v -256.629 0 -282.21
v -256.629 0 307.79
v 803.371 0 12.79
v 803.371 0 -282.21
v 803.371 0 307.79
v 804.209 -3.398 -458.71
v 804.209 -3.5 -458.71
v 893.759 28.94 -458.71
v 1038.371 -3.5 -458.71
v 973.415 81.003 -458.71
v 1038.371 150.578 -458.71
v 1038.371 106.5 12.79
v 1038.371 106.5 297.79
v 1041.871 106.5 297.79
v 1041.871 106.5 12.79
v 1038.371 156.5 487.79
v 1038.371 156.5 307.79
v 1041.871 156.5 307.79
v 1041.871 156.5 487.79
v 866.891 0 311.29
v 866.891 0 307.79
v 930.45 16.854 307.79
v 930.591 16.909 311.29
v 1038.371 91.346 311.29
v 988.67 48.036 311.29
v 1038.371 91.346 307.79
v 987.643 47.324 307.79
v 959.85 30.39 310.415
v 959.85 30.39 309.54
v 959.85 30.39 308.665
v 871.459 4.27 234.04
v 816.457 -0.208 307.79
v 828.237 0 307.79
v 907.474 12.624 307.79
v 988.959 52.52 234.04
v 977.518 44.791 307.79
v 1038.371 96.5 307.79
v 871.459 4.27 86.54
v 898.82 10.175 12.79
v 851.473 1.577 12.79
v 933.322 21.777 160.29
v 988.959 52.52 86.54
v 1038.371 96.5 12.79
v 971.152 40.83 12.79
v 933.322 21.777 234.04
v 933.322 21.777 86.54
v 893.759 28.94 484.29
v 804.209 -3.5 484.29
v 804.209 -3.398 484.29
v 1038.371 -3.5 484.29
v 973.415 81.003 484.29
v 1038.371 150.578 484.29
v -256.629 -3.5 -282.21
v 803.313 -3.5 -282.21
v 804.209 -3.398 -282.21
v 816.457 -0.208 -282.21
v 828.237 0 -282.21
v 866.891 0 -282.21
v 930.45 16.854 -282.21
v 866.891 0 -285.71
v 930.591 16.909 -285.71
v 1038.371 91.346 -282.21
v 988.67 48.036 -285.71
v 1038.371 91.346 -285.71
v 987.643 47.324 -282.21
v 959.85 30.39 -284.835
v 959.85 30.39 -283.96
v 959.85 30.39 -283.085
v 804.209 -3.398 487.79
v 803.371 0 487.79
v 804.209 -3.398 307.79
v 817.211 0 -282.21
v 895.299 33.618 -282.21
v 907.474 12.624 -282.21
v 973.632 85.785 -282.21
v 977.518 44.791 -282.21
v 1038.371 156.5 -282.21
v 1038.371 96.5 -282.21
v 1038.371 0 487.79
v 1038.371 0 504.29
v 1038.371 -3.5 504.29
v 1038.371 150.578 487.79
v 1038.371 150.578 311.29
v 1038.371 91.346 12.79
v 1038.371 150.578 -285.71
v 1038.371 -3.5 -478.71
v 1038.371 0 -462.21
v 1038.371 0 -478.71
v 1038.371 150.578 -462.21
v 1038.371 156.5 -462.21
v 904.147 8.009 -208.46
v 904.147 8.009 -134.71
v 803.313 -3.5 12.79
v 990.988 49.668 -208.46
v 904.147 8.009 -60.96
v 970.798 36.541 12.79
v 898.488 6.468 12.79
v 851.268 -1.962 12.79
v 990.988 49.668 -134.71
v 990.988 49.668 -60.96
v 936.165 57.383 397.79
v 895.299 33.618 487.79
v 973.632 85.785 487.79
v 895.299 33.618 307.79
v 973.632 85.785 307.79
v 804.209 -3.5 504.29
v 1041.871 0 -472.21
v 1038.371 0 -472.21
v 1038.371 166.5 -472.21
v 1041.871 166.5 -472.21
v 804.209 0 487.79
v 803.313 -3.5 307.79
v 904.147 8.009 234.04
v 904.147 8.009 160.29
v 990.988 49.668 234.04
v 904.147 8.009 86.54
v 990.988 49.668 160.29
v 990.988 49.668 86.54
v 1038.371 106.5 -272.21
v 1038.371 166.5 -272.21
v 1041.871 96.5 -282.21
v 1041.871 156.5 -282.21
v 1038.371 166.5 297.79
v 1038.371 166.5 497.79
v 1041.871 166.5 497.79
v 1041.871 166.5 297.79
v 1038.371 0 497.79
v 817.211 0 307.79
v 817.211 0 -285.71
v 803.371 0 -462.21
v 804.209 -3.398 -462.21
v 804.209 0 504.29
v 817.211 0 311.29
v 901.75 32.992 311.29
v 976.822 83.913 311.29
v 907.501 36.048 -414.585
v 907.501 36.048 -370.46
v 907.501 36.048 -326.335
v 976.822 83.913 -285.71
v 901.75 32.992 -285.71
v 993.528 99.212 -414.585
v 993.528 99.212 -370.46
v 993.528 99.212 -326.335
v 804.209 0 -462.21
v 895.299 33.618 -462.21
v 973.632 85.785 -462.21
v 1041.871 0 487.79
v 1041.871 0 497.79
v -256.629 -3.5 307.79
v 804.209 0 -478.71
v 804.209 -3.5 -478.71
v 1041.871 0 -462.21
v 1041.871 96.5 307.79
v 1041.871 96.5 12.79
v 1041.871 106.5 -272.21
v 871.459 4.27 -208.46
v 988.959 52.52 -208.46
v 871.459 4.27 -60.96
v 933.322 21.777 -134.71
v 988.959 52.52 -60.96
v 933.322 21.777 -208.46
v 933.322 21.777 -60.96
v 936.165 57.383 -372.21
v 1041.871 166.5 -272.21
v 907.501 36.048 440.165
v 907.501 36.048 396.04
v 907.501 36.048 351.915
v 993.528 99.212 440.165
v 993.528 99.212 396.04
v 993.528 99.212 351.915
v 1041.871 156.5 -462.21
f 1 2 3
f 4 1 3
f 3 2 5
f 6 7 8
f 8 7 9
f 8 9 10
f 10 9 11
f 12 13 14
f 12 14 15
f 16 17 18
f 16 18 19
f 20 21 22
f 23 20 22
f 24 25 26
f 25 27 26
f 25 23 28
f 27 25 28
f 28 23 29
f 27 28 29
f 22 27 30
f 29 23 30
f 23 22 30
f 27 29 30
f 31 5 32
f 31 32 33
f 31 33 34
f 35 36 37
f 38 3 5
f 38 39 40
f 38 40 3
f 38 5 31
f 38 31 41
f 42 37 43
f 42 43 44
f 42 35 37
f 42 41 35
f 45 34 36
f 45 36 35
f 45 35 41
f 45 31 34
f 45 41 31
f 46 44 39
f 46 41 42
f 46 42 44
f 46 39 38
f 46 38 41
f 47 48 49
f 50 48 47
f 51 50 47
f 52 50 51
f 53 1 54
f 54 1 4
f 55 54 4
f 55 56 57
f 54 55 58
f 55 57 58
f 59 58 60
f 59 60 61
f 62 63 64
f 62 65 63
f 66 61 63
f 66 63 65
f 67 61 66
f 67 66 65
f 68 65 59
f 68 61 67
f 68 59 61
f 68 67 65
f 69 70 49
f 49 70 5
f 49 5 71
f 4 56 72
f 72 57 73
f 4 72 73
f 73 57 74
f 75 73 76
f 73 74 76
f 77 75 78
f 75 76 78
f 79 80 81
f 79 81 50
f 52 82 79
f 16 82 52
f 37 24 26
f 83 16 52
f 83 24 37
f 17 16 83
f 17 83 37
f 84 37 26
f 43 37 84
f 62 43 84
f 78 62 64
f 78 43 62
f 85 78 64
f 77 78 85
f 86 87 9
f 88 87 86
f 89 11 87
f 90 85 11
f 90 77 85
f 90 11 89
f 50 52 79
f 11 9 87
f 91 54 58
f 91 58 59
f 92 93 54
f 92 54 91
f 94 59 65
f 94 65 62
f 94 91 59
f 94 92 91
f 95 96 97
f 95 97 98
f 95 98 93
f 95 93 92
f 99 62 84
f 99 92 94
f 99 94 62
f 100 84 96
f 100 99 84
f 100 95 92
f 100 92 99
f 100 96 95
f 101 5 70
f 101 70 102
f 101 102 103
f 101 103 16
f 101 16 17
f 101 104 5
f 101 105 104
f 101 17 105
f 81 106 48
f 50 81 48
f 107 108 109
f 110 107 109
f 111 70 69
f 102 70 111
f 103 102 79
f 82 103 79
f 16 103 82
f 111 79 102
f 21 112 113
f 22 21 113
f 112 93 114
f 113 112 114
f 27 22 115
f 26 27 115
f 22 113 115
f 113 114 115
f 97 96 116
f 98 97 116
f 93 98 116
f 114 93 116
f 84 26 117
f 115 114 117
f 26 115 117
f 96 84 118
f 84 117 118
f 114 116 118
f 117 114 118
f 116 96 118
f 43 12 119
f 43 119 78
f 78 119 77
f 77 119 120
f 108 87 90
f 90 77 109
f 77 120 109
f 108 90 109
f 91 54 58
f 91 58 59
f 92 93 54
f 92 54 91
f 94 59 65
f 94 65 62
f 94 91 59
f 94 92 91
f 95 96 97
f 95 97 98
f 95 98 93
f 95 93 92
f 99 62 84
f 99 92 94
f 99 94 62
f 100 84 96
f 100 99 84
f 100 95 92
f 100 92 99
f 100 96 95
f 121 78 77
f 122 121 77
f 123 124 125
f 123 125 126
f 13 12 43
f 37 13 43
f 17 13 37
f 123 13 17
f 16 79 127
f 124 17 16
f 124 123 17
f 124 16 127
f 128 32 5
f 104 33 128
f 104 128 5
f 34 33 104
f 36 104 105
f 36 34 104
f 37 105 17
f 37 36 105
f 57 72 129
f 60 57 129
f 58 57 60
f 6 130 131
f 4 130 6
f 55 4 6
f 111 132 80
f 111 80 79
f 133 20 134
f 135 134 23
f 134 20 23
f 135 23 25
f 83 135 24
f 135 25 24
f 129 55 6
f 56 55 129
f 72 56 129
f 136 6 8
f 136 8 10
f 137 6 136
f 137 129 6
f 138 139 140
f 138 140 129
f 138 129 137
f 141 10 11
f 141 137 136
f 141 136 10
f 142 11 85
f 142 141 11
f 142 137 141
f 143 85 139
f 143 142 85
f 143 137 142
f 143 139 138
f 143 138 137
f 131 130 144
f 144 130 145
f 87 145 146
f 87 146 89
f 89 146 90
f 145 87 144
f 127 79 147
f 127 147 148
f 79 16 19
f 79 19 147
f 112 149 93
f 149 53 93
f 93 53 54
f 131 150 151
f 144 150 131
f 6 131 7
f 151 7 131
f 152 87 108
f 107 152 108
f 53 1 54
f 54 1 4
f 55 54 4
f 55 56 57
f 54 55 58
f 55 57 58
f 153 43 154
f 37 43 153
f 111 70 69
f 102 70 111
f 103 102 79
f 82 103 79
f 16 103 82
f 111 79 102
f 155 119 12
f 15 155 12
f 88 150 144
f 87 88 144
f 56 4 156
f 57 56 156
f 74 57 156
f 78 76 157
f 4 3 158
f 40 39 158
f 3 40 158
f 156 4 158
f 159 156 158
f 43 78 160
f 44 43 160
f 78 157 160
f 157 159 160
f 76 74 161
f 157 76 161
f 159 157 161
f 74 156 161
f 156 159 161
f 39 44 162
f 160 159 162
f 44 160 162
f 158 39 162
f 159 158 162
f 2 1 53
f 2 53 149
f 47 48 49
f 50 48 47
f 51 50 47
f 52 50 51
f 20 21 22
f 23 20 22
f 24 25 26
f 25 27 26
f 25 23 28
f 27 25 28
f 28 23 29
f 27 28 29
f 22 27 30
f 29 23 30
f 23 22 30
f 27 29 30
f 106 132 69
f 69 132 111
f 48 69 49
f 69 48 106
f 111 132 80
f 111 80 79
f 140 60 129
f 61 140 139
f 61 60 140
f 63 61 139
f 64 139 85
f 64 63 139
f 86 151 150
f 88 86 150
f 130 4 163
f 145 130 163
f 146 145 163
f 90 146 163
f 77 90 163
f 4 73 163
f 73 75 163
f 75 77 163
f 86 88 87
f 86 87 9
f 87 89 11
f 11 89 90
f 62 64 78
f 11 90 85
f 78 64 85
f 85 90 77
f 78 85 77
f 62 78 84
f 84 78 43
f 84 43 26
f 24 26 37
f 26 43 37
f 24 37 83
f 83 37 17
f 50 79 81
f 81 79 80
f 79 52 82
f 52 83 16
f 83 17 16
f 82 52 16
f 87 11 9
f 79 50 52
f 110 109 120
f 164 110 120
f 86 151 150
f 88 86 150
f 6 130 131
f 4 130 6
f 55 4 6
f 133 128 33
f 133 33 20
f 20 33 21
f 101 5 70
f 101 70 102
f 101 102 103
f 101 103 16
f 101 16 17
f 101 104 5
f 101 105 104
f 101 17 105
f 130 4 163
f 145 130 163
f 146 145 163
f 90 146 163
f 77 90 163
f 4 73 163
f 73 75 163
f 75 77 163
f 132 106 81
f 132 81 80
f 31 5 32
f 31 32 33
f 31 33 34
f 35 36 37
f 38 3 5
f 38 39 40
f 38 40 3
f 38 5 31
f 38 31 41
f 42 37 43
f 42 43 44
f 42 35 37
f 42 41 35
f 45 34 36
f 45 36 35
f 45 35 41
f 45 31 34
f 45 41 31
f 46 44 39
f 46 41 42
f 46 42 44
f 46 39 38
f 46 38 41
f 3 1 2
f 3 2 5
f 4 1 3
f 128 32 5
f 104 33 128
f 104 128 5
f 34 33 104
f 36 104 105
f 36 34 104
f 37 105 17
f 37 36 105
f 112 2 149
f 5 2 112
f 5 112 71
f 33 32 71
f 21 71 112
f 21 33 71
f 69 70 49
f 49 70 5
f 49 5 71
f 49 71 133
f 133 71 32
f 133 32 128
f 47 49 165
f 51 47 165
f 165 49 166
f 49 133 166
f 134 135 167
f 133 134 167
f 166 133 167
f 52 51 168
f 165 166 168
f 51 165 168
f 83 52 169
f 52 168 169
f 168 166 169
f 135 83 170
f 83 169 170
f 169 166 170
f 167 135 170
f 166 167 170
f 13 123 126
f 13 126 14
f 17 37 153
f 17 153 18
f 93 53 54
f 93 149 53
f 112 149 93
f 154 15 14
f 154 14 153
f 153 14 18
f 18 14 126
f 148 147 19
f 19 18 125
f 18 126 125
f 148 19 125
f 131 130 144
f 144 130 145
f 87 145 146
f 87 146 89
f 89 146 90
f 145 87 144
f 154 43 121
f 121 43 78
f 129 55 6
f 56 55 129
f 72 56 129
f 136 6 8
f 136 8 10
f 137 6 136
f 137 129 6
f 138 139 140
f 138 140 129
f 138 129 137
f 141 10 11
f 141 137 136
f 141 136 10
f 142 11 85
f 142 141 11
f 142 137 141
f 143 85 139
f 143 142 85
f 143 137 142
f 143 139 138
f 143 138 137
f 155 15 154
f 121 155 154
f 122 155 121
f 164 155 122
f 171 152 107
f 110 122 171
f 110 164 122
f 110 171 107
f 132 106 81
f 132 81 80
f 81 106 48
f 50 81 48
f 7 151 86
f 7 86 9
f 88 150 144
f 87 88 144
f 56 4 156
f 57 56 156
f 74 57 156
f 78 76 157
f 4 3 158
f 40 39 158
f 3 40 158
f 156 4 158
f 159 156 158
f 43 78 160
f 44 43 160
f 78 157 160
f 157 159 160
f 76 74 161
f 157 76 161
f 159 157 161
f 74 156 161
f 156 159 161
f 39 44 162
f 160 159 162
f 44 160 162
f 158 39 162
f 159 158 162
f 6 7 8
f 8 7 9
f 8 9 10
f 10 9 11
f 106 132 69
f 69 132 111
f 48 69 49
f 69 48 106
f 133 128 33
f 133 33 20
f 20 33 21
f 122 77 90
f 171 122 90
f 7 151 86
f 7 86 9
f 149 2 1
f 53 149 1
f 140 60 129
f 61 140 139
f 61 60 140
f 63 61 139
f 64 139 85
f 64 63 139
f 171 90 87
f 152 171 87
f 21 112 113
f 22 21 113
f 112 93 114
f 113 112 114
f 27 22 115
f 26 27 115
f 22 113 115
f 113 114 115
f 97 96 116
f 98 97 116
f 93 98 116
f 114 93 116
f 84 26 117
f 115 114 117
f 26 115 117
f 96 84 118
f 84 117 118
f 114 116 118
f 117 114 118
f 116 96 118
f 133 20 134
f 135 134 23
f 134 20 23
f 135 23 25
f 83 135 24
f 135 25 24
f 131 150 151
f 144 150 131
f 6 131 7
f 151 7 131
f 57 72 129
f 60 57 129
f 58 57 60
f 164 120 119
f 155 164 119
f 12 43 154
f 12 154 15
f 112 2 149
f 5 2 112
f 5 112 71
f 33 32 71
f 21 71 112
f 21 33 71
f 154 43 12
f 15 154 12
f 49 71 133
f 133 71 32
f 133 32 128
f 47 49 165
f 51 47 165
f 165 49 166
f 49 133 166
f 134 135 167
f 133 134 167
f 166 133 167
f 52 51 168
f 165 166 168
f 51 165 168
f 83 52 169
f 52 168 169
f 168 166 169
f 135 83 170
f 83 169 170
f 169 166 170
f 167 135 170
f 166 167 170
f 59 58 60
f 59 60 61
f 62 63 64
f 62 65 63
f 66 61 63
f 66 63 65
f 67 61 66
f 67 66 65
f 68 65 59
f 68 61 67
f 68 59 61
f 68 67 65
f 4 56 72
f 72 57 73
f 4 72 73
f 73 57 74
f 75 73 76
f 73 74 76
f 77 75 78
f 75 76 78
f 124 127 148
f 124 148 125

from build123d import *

# Parameters (mm, degrees)
SKETCH1_W            = 1060
SKETCH1_H            = 590
BOSS_EXTRUDE1_DEPTH  = 3.5
EXTRUDE_THIN1_START  = -590
EXTRUDE_THIN1_DEPTH  = 590
EXTRUDE_THIN2_DEPTH  = 180
EXTRUDE_THIN3_REACH  = 1162.405
SKETCH11_W           = 236.744190684
SKETCH11_H           = 3.5
EXTRUDE_THIN4_REACH  = 1162.405
SKETCH13_W           = 235
SKETCH13_H           = 3.5
CUT_EXTRUDE1_START   = -950
SKETCH18_W           = 9.295788825
SKETCH18_H           = 156.5
CUT_EXTRUDE1_DEPTH   = 950
CUT_EXTRUDE2_DEPTH   = 35.5
BOSS_EXTRUDE9_DEPTH  = 3.5
SKETCH27_W           = 20
SKETCH27_H           = 3.5
BOSS_EXTRUDE10_DEPTH = 234.162052
SKETCH31_W           = 516.811278328
SKETCH31_H           = 219.504039685
CUT_EXTRUDE7_DEPTH   = 190.5
CUT_EXTRUDE8_START   = -1295
SKETCH32_W           = 505.926906796
SKETCH32_H           = 339.060315412
CUT_EXTRUDE8_DEPTH   = 1295


# Read off the part's stored shape, not the designer's step: Extrude-Thin1, Extrude-Thin2
with BuildPart() as part:
    # Sketch1 → Boss-Extrude1 (new body)
    with BuildSketch(Plane(origin=(0, 0, 0), x_dir=(1, 0, 0), z_dir=(0, 1, 0))):
        with Locations((273.370786517, -12.790262172)):
            Rectangle(SKETCH1_W, SKETCH1_H)
    extrude(amount=-BOSS_EXTRUDE1_DEPTH)

    # Extrude-Thin1 outline → Extrude-Thin1 (add)
    with BuildSketch(Plane.XY.offset(307.790262172).offset(EXTRUDE_THIN1_START)):
        with BuildLine():
            Line((803.370786517, -3.5), (803.313227264, -3.5))
            add(Edge.make_bspline(
                [(803.313227264, -3.5), (827.239281851, -4.28540716), (850.150849594, -2.84924817), (893.9422698, 4.489313064), (914.820042541, 10.395966502), (954.483208023, 26.683181264), (973.267586216, 37.063539809), (1008.708428447, 62.273168795), (1025.364681446, 77.101551974), (1040.952925263, 94.13725594)],
                knots=[0.000201097, 0.000201097, 0.000201097, 0.000201097, 0.25, 0.25, 0.5, 0.5, 0.75, 0.75, 1, 1, 1, 1], degree=3))
            Line((1040.952925263, 94.13725594), (1038.370786517, 96.5))
            add(Edge.make_bspline(
                [(803.370786517, 0), (945.773453098, -4.695540598), (1038.370786517, 96.5)],
                knots=[0, 0, 0, 1, 1, 1], degree=2))
            Line((803.370786517, 0), (803.370786517, -3.5))
        make_face()
    extrude(amount=EXTRUDE_THIN1_DEPTH)

    # Extrude-Thin2 outline → Extrude-Thin2 (add)
    with BuildSketch(Plane.XY.offset(307.790262172)):
        with BuildLine():
            Line((803.370786517, 0), (804.208734579, -3.398211742))
            add(Edge.make_bspline(
                [(804.208734579, -3.398211742), (829.067667959, 2.73162849), (852.660481385, 10.617424921), (897.298530323, 29.90649551), (918.34352591, 41.30991081), (957.865744307, 67.630026466), (976.342654863, 82.546590392), (1010.7128816, 115.877947479), (1026.606120018, 134.292434803), (1041.205275081, 154.446789202)],
                knots=[0, 0, 0, 0, 0.25, 0.25, 0.5, 0.5, 0.75, 0.75, 1, 1, 1, 1], degree=3))
            Line((1041.205275081, 154.446789202), (1038.370786517, 156.5))
            add(Edge.make_bspline(
                [(803.370786517, 0), (951.458443478, 36.516195756), (1038.370786517, 156.5)],
                knots=[0, 0, 0, 1, 1, 1], degree=2))
        make_face()
    extrude_thin2 = extrude(amount=EXTRUDE_THIN2_DEPTH)

    # Sketch11 → Extrude-Thin3 (add, up to next)
    with BuildSketch(Plane(origin=(0, 0, 0), x_dir=(1, 0, 0), z_dir=(0, 1, 0)), mode=Mode.PRIVATE) as extrude_thin3_sk1:
        with Locations((922.580829921, -309.540262172)):
            Rectangle(SKETCH11_W, SKETCH11_H)
    extrude_thin3_tool1 = extrude(extrude_thin3_sk1.sketch, amount=EXTRUDE_THIN3_REACH, mode=Mode.PRIVATE) - part.part
    extrude_thin3 = extrude_thin3_tool1.solids().sort_by_distance((922.58083, 0, 309.540262))[0]
    add(extrude_thin3)

    # Sketch13 → Extrude-Thin4 (add, up to next)
    with BuildSketch(Plane(origin=(0, 0, 0), x_dir=(1, 0, 0), z_dir=(0, 1, 0)), mode=Mode.PRIVATE) as extrude_thin4_sk1:
        with Locations((920.870786517, -486.040262172)):
            Rectangle(SKETCH13_W, SKETCH13_H)
    extrude_thin4_tool1 = extrude(extrude_thin4_sk1.sketch, amount=EXTRUDE_THIN4_REACH, mode=Mode.PRIVATE) - part.part
    extrude_thin4 = extrude_thin4_tool1.solids().sort_by_distance((920.870787, 0, 486.040262))[0]
    add(extrude_thin4)

    # Mirror1: Extrude-Thin2, Extrude-Thin3, Extrude-Thin4 across plane
    add(extrude_thin2.mirror(Plane.XY.offset(12.790262172)))
    add(extrude_thin3.mirror(Plane.XY.offset(12.790262172)))
    add(extrude_thin4.mirror(Plane.XY.offset(12.790262172)))

    # Sketch18 → Cut-Extrude1 (cut)
    with BuildSketch(Plane.XY.offset(487.790262172).offset(CUT_EXTRUDE1_START)):
        with Locations((1043.01868093, 78.25)):
            Rectangle(SKETCH18_W, SKETCH18_H)
    extrude(amount=CUT_EXTRUDE1_DEPTH, mode=Mode.SUBTRACT)

    # Sketch23 → Cut-Extrude2 (cut)
    with BuildSketch(Plane(origin=(0, 0, 307.790262172), x_dir=(-1, 0, 0), z_dir=(0, 0, -1))):
        with BuildLine():
            add(Edge.make_bspline(
                [(-866.890762603, 0), (-868.612672192, 0.259242322), (-870.328336217, 0.532092751), (-893.9422698, 4.489313064), (-914.820042541, 10.395966502), (-954.483208023, 26.683181264), (-973.267586216, 37.063539809), (-1007.733659748, 61.579800475), (-1023.528999951, 75.476914558), (-1038.370786517, 91.345985167)],
                knots=[0.230490173, 0.230490173, 0.230490173, 0.230490173, 0.25, 0.25, 0.5, 0.5, 0.75, 0.75, 0.986247947, 0.986247947, 0.986247947, 0.986247947], degree=3))
            Line((-1038.370786517, 91.345985167), (-1038.370786517, 0))
            Line((-1038.370786517, 0), (-866.890762603, 0))
        make_face()
    cut_extrude2 = extrude(amount=-CUT_EXTRUDE2_DEPTH, mode=Mode.SUBTRACT)

    # Mirror2: Cut-Extrude2 across plane
    add(cut_extrude2.mirror(Plane.XY.offset(12.790262172)), mode=Mode.SUBTRACT)

    # Sketch27 → Boss-Extrude10 (add)
    with BuildSketch(Plane(origin=(1038.370786517, 0, 0), x_dir=(0, 0, -1), z_dir=(1, 0, 0))):
        with Locations((-494.290262172, -1.75)):
            Rectangle(SKETCH27_W, SKETCH27_H)
    extrude(amount=-BOSS_EXTRUDE10_DEPTH)

    # Sketch32 → Cut-Extrude8 (cut)
    with BuildSketch(Plane(origin=(1038.370786517, 0, 0), x_dir=(0, 0, -1), z_dir=(1, 0, 0)).offset(CUT_EXTRUDE8_START)):
        with Locations((240.173191226, 40.919391946)):
            Rectangle(SKETCH32_W, SKETCH32_H)
    extrude(amount=CUT_EXTRUDE8_DEPTH, mode=Mode.SUBTRACT)

    # Mirror12: part across plane


with BuildPart() as body_2:
    # Sketch24 → Boss-Extrude9 (new body)
    with BuildSketch(Plane(origin=(1038.370786517, 0, 0), x_dir=(0, 0, -1), z_dir=(1, 0, 0))):
        Polygon((-497.790262172, 166.5), (-297.790262172, 166.5), (-297.790262172, 106.5), (272.209737828, 106.5), (272.209737828, 166.5), (472.209737828, 166.5), (472.209737828, -0.060643547), (462.209737828, 0), (462.209737828, 156.5), (282.209737828, 156.5), (282.209737828, 96.5), (-307.790262172, 96.5), (-307.790262172, 156.5), (-487.790262172, 156.5), (-487.790262172, 0), (-497.790262172, 0), align=None)
    extrude(amount=BOSS_EXTRUDE9_DEPTH)

    # Sketch31 → Cut-Extrude7 (cut)
    with BuildSketch(Plane(origin=(1038.370786517, 0, 0), x_dir=(0, 0, -1), z_dir=(1, 0, 0))):
        with Locations((245.615376992, 106.252019843)):
            Rectangle(SKETCH31_W, SKETCH31_H)
    extrude(amount=CUT_EXTRUDE7_DEPTH, mode=Mode.SUBTRACT)


with BuildPart() as part_1:
    add(part.part)
    add(part.part.mirror(Plane.XY.offset(12.790262172)))


with BuildPart() as body_3:
    # Mirror13: mirrored copy
    add(body_2.part.mirror(Plane.XY.offset(12.790262172)))


with BuildPart() as body_4:
    # Mirror13 2: mirrored copy
    add(part_1.part.mirror(Plane.XY.offset(12.790262172)))


solid = Compound([body_2.part, part_1.part, body_3.part, body_4.part])
